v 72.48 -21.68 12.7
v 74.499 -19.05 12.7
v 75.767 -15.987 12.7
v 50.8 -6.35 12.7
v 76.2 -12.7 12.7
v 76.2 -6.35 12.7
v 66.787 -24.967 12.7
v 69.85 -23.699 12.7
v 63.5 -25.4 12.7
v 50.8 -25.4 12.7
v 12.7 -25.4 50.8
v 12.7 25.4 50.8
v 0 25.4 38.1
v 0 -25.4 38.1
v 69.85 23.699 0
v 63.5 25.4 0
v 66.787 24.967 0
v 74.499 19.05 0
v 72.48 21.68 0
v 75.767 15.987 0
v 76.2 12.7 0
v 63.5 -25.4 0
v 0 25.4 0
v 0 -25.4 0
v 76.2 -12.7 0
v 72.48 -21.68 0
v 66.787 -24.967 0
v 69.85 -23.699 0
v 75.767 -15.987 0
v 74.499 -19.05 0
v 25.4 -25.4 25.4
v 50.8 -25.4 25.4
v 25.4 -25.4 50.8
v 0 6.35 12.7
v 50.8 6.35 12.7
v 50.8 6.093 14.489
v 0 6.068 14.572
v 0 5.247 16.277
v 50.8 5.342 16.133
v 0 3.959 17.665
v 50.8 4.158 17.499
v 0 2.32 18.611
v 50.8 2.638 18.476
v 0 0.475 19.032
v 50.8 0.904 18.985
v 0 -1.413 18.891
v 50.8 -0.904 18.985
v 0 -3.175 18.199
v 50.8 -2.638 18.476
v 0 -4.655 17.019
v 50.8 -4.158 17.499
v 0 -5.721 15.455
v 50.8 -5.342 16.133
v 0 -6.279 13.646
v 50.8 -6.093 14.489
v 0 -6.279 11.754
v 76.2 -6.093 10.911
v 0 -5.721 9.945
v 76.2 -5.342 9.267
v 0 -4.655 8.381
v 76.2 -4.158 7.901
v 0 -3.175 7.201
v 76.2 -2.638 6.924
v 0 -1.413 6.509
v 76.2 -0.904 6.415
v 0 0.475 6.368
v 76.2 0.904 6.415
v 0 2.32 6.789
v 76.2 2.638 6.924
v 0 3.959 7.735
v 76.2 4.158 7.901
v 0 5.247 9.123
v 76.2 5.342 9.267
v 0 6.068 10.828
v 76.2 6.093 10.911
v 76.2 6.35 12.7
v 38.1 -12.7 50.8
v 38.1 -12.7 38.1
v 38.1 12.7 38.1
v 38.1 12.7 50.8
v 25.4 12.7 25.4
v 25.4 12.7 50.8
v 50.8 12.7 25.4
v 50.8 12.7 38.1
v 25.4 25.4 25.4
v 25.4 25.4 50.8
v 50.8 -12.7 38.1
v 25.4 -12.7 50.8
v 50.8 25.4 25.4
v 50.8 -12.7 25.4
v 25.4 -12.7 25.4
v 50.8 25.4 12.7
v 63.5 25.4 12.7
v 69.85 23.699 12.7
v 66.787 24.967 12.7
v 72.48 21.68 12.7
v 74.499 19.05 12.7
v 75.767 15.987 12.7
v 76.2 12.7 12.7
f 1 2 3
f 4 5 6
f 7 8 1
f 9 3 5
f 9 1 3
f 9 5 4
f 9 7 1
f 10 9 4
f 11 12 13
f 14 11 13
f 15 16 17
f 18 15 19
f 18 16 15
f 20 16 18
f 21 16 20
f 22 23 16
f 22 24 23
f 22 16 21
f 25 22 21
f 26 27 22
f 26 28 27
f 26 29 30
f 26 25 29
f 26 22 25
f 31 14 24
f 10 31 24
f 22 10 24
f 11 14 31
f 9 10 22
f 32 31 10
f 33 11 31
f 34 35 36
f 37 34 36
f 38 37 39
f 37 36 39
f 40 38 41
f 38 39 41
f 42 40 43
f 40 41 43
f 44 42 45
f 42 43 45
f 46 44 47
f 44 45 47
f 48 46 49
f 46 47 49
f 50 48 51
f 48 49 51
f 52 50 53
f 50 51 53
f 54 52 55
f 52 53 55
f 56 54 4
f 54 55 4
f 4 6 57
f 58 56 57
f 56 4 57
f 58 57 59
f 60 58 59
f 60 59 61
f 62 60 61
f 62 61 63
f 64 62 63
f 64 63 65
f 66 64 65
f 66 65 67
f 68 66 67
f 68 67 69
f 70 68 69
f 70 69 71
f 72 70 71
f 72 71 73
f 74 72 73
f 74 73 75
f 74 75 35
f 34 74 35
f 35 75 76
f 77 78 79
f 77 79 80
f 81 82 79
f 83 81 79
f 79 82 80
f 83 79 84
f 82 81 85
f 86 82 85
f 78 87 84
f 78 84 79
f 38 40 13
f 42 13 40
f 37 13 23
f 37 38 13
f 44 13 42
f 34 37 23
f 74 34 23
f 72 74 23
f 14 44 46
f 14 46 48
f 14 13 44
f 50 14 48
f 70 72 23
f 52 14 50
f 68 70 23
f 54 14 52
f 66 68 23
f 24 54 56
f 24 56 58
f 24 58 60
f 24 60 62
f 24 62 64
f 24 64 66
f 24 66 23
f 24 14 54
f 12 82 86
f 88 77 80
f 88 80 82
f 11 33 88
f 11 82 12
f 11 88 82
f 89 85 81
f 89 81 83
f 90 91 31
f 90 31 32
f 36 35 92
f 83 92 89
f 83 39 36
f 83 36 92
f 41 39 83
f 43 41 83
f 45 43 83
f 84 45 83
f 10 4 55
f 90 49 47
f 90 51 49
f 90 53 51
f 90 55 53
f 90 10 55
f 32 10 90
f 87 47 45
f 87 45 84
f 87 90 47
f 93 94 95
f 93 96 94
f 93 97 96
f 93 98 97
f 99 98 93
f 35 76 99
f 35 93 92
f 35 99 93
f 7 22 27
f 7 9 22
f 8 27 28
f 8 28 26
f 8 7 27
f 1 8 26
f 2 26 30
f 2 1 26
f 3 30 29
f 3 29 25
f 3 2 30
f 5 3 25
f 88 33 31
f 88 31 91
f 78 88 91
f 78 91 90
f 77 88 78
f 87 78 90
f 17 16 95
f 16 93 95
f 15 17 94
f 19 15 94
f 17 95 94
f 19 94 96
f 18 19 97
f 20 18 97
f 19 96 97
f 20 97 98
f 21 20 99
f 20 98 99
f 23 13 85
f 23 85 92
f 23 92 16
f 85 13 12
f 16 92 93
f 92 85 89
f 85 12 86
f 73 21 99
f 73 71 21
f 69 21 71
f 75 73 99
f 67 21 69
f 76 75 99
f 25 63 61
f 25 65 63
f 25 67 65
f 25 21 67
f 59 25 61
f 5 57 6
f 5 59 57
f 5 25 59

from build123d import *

# Parameters (mm, degrees)
F1_DEPTH = 25.4
F2_W     = 25.4
F2_H     = 12.7
F3_DEPTH = 25.4
F4_R     = 6.35
F5_DEPTH = 76.201
F6_R     = 12.7


with BuildPart() as f1:
    # F0 (on Front) → F1 (new body, symmetric)
    with BuildSketch(Plane.XZ):
        Polygon((0, 38.1), (0, 0), (76.2, 0), (76.2, 12.7), (50.8, 12.7), (50.8, 25.4), (25.4, 25.4), (25.4, 50.8), (12.7, 50.8), align=None)
        Polygon((38.1, 50.8), (25.4, 50.8), (25.4, 25.4), (50.8, 25.4), (50.8, 38.1), (38.1, 38.1), align=None)
    extrude(amount=F1_DEPTH, both=True)

    # F2 (on face) → F3 (cut)
    with BuildSketch(Plane.XY.offset(50.8)):
        with Locations((38.1, 19.05)):
            Rectangle(F2_W, F2_H)
        with Locations((38.1, -19.05)):
            Rectangle(F2_W, F2_H)
    extrude(amount=-F3_DEPTH, mode=Mode.SUBTRACT)

    # F4 (on face) → F5 (cut, through all)
    with BuildSketch(Plane.YZ.offset(76.2)):
        with Locations((0, 12.7)):
            Circle(F4_R)
    extrude(amount=-F5_DEPTH, mode=Mode.SUBTRACT)

    # F6
    f6_edges = [f1.edges().sort_by_distance(p)[0] for p in [
        (76.2, -25.4, 6.35),
        (76.2, 25.4, 6.35),
    ]]
    fillet(f6_edges, radius=F6_R)


solid = f1.part
